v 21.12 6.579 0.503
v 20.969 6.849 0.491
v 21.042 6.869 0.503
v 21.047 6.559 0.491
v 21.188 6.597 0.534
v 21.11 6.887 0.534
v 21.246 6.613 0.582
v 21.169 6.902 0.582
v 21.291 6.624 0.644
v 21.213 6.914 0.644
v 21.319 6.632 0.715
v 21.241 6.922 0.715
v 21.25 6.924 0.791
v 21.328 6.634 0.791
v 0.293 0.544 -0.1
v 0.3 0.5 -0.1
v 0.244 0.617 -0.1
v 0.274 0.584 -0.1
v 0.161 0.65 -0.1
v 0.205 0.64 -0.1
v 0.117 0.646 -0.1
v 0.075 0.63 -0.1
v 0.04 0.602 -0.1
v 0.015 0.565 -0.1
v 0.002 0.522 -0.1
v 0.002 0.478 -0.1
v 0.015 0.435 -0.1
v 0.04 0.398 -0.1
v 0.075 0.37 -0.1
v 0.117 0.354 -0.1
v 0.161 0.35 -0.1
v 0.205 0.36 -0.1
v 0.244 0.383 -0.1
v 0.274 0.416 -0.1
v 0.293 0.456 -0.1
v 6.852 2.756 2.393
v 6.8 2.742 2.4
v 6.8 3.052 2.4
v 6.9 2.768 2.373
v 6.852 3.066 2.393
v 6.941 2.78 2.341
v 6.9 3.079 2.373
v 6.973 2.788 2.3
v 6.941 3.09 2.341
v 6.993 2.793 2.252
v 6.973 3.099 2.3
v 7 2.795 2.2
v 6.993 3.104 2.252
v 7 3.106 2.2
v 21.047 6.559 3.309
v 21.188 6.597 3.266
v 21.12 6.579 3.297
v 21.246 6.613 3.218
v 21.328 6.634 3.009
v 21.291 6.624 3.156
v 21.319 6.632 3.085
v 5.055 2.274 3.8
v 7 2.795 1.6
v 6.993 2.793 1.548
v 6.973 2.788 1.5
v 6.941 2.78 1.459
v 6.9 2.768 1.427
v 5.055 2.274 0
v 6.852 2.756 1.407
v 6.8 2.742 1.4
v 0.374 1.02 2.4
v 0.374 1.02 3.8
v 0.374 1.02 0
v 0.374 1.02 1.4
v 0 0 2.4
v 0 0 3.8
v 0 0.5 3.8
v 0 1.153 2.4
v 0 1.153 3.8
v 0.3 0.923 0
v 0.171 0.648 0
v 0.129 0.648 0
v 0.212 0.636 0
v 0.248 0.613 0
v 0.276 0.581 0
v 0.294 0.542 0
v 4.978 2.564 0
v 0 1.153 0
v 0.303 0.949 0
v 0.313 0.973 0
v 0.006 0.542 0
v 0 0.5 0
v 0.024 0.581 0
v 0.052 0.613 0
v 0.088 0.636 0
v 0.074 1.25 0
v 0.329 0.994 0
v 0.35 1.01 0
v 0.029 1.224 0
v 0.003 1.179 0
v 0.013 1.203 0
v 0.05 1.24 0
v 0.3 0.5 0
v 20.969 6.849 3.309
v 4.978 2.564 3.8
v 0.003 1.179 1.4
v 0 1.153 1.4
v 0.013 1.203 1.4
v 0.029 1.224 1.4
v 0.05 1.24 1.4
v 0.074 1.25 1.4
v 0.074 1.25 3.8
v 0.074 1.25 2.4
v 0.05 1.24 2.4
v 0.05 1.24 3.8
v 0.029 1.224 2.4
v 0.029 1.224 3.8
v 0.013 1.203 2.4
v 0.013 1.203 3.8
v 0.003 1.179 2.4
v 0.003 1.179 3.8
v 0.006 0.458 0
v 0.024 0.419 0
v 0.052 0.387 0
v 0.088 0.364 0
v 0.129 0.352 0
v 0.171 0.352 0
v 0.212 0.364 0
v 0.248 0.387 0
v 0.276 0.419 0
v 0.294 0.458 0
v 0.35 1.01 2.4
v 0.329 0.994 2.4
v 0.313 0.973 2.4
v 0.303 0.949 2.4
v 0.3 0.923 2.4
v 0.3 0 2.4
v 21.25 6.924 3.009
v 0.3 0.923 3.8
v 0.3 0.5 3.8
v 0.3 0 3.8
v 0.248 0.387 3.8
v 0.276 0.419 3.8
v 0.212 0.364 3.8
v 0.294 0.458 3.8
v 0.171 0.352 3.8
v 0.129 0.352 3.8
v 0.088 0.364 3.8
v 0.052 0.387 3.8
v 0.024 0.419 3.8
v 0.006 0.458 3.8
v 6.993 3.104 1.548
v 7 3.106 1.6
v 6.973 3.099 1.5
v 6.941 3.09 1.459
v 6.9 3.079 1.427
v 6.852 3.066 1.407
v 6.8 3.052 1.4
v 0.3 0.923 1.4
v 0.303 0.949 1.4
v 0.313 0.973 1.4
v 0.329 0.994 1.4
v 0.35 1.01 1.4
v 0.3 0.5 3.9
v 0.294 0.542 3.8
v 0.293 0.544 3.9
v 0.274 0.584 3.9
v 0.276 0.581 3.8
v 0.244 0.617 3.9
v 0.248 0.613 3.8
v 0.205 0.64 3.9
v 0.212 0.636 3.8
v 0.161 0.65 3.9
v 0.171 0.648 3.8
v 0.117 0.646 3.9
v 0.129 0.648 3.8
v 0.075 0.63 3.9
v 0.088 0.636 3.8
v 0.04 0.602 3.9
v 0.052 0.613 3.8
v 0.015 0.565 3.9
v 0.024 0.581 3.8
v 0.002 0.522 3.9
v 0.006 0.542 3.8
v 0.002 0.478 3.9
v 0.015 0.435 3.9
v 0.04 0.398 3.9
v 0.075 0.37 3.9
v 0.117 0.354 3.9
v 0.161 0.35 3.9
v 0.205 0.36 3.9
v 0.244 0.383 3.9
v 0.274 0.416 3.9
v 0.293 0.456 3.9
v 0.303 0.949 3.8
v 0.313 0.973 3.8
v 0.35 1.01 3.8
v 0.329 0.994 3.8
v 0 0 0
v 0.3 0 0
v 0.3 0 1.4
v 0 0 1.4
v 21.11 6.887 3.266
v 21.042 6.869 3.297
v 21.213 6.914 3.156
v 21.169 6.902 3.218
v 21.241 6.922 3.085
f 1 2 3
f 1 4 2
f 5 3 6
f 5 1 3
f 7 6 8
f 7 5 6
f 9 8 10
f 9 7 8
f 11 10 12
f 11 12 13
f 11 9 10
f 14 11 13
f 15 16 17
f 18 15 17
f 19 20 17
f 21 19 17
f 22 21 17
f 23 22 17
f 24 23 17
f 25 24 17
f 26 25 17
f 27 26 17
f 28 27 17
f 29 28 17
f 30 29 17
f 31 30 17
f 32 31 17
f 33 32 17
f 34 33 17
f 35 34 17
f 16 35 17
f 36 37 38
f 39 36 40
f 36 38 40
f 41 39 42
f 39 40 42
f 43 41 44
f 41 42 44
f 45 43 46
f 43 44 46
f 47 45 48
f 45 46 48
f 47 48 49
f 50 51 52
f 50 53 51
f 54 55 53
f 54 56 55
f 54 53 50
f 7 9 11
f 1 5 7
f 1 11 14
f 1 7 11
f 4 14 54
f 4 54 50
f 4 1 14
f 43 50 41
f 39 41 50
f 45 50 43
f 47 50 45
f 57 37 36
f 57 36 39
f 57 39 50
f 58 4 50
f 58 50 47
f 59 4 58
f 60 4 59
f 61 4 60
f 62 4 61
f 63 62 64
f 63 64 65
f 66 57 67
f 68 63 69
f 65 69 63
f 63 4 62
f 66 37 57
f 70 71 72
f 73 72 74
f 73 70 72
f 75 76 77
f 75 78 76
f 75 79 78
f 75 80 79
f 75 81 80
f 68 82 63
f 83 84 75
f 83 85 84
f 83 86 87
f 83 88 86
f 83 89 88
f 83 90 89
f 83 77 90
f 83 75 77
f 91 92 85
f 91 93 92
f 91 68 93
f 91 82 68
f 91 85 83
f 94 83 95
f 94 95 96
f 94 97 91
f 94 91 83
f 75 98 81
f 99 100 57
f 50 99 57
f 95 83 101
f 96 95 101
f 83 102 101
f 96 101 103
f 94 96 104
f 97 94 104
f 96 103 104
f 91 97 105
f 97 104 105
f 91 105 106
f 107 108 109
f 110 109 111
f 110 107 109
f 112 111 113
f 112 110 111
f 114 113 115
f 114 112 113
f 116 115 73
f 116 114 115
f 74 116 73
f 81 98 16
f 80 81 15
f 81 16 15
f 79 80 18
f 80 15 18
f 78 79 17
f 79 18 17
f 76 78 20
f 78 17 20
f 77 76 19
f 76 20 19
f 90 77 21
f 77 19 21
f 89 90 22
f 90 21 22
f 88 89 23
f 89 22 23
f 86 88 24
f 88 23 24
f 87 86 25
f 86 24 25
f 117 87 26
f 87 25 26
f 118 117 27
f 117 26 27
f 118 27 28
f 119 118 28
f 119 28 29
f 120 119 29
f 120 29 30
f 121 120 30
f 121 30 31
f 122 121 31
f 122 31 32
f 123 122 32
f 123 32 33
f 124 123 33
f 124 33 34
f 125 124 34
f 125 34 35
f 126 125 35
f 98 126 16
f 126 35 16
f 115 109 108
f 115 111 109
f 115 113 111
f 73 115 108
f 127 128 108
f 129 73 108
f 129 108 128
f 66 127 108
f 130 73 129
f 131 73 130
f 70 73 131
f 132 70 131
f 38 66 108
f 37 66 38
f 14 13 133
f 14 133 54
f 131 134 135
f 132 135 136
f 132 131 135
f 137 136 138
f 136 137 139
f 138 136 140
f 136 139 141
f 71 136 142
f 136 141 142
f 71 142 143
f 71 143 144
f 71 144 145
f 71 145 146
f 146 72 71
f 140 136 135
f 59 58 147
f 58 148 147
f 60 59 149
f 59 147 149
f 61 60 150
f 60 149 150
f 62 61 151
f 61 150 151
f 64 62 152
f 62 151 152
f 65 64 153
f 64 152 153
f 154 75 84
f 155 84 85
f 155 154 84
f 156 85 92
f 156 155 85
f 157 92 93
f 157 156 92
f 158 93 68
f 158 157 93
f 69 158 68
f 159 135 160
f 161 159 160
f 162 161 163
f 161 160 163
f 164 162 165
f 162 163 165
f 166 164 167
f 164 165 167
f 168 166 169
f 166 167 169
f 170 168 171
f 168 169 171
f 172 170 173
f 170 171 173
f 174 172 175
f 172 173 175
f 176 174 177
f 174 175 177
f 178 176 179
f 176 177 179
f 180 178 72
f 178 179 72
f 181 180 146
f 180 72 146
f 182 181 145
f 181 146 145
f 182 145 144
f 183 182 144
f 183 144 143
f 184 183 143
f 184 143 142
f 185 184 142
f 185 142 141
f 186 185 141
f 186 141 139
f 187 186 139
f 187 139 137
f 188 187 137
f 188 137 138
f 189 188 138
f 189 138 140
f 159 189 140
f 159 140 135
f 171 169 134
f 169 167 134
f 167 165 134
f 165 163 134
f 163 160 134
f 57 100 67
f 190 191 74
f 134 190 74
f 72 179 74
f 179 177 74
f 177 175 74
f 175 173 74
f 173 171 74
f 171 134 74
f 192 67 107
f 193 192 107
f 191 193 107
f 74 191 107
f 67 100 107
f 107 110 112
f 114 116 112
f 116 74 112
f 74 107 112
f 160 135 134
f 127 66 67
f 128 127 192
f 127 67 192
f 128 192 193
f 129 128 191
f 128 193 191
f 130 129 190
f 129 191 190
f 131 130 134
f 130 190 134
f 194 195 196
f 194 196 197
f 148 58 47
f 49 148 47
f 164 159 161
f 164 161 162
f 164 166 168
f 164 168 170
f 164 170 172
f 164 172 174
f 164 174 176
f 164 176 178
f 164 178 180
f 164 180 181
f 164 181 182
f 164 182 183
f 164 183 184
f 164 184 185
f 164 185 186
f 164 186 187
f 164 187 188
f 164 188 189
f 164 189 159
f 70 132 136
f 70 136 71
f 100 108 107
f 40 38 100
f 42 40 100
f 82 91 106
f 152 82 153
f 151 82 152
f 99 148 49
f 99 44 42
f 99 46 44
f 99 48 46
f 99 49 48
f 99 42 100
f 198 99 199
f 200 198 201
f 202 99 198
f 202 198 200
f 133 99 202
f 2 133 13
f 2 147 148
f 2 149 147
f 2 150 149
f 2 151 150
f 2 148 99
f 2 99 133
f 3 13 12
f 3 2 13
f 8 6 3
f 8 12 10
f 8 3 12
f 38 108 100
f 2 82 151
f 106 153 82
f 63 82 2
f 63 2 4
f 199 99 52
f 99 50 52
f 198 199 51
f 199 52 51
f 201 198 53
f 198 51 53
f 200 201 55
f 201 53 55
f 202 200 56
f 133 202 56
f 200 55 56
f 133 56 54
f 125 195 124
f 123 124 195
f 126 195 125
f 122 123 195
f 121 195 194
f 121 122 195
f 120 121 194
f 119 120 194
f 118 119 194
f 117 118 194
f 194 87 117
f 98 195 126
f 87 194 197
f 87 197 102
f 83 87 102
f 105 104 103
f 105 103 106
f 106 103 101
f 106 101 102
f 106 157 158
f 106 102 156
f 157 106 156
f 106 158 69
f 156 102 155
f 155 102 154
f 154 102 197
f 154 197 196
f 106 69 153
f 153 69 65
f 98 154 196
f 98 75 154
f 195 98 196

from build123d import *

# Parameters (mm, degrees)
PROFILE_EXTRUDE_DEPTH   = 3.8
CHAMFER_TOP_SIZE        = 0.5
CHAMFER_TOP_SIZE2       = 16.846754467
PINS_EXTRUDE_DEPTH      = 0.1
PINS_EXTRUDE_DEPTH_BACK = 3.9
SKETCH3_R               = 0.15
SLOT_SKETCH_W           = 7
SLOT_SKETCH_H           = 1
SLOT_CUT_DEPTH          = 10
FILLET1_R               = 0.1
FILLET2_R               = 0.3
FILLET3_R               = 0.2


with BuildPart() as part:
    # Profile Sketch → Profile Extrude (new body)
    with BuildSketch(Plane.XY):
        Polygon((0, 0), (0, 1.230198096), (21.250368178, 6.924217089), (21.328013892, 6.634439341), (0.3, 1), (0.3, 0), align=None)
    extrude(amount=PROFILE_EXTRUDE_DEPTH)

    # Chamfer Top
    chamfer_top_edges = [part.edges().sort_by_distance(p)[0] for p in [
        (21.289191035, 6.779328215, 3.8),
        (21.289191035, 6.779328215, 0),
    ]]
    chamfer_top_side = [part.faces().sort_by_distance(p)[0] for p in [
        (21.289191035, 6.779328215, 1.9),
    ]]
    chamfer(chamfer_top_edges, length=CHAMFER_TOP_SIZE, length2=CHAMFER_TOP_SIZE2, reference=chamfer_top_side[0])

    # Sketch3 → Pins Extrude (add, two sides: drawn at the far end of the back side and taken through both)
    with BuildSketch(Plane.XY.offset(3.8).offset(-PINS_EXTRUDE_DEPTH_BACK)):
        with Locations((0.15, 0.5)):
            Circle(SKETCH3_R)
    extrude(amount=PINS_EXTRUDE_DEPTH + PINS_EXTRUDE_DEPTH_BACK)

    # Slot Sketch → Slot Cut (cut)
    with BuildSketch(Plane.XZ):
        with Locations((3.5, 1.9)):
            Rectangle(SLOT_SKETCH_W, SLOT_SKETCH_H)
    extrude(amount=-SLOT_CUT_DEPTH, mode=Mode.SUBTRACT)

    # Fillet1
    fillet1_edges = [part.edges().sort_by_distance(p)[0] for p in [
        (0, 1.230198096, 3.1),
        (0.3, 1, 3.1),
        (0, 1.230198096, 0.7),
        (0.3, 1, 0.7),
    ]]
    fillet(fillet1_edges, radius=FILLET1_R)

    # Fillet2
    fillet2_edges = [part.edges().sort_by_distance(p)[0] for p in [
        (21.289191035, 6.779328215, 0.5),
        (21.289191035, 6.779328215, 3.3),
    ]]
    fillet(fillet2_edges, radius=FILLET2_R)

    # Fillet3
    fillet3_edges = [part.edges().sort_by_distance(p)[0] for p in [
        (7, 2.950551016, 2.4),
        (7, 2.950551016, 1.4),
    ]]
    fillet(fillet3_edges, radius=FILLET3_R)


solid = part.part
